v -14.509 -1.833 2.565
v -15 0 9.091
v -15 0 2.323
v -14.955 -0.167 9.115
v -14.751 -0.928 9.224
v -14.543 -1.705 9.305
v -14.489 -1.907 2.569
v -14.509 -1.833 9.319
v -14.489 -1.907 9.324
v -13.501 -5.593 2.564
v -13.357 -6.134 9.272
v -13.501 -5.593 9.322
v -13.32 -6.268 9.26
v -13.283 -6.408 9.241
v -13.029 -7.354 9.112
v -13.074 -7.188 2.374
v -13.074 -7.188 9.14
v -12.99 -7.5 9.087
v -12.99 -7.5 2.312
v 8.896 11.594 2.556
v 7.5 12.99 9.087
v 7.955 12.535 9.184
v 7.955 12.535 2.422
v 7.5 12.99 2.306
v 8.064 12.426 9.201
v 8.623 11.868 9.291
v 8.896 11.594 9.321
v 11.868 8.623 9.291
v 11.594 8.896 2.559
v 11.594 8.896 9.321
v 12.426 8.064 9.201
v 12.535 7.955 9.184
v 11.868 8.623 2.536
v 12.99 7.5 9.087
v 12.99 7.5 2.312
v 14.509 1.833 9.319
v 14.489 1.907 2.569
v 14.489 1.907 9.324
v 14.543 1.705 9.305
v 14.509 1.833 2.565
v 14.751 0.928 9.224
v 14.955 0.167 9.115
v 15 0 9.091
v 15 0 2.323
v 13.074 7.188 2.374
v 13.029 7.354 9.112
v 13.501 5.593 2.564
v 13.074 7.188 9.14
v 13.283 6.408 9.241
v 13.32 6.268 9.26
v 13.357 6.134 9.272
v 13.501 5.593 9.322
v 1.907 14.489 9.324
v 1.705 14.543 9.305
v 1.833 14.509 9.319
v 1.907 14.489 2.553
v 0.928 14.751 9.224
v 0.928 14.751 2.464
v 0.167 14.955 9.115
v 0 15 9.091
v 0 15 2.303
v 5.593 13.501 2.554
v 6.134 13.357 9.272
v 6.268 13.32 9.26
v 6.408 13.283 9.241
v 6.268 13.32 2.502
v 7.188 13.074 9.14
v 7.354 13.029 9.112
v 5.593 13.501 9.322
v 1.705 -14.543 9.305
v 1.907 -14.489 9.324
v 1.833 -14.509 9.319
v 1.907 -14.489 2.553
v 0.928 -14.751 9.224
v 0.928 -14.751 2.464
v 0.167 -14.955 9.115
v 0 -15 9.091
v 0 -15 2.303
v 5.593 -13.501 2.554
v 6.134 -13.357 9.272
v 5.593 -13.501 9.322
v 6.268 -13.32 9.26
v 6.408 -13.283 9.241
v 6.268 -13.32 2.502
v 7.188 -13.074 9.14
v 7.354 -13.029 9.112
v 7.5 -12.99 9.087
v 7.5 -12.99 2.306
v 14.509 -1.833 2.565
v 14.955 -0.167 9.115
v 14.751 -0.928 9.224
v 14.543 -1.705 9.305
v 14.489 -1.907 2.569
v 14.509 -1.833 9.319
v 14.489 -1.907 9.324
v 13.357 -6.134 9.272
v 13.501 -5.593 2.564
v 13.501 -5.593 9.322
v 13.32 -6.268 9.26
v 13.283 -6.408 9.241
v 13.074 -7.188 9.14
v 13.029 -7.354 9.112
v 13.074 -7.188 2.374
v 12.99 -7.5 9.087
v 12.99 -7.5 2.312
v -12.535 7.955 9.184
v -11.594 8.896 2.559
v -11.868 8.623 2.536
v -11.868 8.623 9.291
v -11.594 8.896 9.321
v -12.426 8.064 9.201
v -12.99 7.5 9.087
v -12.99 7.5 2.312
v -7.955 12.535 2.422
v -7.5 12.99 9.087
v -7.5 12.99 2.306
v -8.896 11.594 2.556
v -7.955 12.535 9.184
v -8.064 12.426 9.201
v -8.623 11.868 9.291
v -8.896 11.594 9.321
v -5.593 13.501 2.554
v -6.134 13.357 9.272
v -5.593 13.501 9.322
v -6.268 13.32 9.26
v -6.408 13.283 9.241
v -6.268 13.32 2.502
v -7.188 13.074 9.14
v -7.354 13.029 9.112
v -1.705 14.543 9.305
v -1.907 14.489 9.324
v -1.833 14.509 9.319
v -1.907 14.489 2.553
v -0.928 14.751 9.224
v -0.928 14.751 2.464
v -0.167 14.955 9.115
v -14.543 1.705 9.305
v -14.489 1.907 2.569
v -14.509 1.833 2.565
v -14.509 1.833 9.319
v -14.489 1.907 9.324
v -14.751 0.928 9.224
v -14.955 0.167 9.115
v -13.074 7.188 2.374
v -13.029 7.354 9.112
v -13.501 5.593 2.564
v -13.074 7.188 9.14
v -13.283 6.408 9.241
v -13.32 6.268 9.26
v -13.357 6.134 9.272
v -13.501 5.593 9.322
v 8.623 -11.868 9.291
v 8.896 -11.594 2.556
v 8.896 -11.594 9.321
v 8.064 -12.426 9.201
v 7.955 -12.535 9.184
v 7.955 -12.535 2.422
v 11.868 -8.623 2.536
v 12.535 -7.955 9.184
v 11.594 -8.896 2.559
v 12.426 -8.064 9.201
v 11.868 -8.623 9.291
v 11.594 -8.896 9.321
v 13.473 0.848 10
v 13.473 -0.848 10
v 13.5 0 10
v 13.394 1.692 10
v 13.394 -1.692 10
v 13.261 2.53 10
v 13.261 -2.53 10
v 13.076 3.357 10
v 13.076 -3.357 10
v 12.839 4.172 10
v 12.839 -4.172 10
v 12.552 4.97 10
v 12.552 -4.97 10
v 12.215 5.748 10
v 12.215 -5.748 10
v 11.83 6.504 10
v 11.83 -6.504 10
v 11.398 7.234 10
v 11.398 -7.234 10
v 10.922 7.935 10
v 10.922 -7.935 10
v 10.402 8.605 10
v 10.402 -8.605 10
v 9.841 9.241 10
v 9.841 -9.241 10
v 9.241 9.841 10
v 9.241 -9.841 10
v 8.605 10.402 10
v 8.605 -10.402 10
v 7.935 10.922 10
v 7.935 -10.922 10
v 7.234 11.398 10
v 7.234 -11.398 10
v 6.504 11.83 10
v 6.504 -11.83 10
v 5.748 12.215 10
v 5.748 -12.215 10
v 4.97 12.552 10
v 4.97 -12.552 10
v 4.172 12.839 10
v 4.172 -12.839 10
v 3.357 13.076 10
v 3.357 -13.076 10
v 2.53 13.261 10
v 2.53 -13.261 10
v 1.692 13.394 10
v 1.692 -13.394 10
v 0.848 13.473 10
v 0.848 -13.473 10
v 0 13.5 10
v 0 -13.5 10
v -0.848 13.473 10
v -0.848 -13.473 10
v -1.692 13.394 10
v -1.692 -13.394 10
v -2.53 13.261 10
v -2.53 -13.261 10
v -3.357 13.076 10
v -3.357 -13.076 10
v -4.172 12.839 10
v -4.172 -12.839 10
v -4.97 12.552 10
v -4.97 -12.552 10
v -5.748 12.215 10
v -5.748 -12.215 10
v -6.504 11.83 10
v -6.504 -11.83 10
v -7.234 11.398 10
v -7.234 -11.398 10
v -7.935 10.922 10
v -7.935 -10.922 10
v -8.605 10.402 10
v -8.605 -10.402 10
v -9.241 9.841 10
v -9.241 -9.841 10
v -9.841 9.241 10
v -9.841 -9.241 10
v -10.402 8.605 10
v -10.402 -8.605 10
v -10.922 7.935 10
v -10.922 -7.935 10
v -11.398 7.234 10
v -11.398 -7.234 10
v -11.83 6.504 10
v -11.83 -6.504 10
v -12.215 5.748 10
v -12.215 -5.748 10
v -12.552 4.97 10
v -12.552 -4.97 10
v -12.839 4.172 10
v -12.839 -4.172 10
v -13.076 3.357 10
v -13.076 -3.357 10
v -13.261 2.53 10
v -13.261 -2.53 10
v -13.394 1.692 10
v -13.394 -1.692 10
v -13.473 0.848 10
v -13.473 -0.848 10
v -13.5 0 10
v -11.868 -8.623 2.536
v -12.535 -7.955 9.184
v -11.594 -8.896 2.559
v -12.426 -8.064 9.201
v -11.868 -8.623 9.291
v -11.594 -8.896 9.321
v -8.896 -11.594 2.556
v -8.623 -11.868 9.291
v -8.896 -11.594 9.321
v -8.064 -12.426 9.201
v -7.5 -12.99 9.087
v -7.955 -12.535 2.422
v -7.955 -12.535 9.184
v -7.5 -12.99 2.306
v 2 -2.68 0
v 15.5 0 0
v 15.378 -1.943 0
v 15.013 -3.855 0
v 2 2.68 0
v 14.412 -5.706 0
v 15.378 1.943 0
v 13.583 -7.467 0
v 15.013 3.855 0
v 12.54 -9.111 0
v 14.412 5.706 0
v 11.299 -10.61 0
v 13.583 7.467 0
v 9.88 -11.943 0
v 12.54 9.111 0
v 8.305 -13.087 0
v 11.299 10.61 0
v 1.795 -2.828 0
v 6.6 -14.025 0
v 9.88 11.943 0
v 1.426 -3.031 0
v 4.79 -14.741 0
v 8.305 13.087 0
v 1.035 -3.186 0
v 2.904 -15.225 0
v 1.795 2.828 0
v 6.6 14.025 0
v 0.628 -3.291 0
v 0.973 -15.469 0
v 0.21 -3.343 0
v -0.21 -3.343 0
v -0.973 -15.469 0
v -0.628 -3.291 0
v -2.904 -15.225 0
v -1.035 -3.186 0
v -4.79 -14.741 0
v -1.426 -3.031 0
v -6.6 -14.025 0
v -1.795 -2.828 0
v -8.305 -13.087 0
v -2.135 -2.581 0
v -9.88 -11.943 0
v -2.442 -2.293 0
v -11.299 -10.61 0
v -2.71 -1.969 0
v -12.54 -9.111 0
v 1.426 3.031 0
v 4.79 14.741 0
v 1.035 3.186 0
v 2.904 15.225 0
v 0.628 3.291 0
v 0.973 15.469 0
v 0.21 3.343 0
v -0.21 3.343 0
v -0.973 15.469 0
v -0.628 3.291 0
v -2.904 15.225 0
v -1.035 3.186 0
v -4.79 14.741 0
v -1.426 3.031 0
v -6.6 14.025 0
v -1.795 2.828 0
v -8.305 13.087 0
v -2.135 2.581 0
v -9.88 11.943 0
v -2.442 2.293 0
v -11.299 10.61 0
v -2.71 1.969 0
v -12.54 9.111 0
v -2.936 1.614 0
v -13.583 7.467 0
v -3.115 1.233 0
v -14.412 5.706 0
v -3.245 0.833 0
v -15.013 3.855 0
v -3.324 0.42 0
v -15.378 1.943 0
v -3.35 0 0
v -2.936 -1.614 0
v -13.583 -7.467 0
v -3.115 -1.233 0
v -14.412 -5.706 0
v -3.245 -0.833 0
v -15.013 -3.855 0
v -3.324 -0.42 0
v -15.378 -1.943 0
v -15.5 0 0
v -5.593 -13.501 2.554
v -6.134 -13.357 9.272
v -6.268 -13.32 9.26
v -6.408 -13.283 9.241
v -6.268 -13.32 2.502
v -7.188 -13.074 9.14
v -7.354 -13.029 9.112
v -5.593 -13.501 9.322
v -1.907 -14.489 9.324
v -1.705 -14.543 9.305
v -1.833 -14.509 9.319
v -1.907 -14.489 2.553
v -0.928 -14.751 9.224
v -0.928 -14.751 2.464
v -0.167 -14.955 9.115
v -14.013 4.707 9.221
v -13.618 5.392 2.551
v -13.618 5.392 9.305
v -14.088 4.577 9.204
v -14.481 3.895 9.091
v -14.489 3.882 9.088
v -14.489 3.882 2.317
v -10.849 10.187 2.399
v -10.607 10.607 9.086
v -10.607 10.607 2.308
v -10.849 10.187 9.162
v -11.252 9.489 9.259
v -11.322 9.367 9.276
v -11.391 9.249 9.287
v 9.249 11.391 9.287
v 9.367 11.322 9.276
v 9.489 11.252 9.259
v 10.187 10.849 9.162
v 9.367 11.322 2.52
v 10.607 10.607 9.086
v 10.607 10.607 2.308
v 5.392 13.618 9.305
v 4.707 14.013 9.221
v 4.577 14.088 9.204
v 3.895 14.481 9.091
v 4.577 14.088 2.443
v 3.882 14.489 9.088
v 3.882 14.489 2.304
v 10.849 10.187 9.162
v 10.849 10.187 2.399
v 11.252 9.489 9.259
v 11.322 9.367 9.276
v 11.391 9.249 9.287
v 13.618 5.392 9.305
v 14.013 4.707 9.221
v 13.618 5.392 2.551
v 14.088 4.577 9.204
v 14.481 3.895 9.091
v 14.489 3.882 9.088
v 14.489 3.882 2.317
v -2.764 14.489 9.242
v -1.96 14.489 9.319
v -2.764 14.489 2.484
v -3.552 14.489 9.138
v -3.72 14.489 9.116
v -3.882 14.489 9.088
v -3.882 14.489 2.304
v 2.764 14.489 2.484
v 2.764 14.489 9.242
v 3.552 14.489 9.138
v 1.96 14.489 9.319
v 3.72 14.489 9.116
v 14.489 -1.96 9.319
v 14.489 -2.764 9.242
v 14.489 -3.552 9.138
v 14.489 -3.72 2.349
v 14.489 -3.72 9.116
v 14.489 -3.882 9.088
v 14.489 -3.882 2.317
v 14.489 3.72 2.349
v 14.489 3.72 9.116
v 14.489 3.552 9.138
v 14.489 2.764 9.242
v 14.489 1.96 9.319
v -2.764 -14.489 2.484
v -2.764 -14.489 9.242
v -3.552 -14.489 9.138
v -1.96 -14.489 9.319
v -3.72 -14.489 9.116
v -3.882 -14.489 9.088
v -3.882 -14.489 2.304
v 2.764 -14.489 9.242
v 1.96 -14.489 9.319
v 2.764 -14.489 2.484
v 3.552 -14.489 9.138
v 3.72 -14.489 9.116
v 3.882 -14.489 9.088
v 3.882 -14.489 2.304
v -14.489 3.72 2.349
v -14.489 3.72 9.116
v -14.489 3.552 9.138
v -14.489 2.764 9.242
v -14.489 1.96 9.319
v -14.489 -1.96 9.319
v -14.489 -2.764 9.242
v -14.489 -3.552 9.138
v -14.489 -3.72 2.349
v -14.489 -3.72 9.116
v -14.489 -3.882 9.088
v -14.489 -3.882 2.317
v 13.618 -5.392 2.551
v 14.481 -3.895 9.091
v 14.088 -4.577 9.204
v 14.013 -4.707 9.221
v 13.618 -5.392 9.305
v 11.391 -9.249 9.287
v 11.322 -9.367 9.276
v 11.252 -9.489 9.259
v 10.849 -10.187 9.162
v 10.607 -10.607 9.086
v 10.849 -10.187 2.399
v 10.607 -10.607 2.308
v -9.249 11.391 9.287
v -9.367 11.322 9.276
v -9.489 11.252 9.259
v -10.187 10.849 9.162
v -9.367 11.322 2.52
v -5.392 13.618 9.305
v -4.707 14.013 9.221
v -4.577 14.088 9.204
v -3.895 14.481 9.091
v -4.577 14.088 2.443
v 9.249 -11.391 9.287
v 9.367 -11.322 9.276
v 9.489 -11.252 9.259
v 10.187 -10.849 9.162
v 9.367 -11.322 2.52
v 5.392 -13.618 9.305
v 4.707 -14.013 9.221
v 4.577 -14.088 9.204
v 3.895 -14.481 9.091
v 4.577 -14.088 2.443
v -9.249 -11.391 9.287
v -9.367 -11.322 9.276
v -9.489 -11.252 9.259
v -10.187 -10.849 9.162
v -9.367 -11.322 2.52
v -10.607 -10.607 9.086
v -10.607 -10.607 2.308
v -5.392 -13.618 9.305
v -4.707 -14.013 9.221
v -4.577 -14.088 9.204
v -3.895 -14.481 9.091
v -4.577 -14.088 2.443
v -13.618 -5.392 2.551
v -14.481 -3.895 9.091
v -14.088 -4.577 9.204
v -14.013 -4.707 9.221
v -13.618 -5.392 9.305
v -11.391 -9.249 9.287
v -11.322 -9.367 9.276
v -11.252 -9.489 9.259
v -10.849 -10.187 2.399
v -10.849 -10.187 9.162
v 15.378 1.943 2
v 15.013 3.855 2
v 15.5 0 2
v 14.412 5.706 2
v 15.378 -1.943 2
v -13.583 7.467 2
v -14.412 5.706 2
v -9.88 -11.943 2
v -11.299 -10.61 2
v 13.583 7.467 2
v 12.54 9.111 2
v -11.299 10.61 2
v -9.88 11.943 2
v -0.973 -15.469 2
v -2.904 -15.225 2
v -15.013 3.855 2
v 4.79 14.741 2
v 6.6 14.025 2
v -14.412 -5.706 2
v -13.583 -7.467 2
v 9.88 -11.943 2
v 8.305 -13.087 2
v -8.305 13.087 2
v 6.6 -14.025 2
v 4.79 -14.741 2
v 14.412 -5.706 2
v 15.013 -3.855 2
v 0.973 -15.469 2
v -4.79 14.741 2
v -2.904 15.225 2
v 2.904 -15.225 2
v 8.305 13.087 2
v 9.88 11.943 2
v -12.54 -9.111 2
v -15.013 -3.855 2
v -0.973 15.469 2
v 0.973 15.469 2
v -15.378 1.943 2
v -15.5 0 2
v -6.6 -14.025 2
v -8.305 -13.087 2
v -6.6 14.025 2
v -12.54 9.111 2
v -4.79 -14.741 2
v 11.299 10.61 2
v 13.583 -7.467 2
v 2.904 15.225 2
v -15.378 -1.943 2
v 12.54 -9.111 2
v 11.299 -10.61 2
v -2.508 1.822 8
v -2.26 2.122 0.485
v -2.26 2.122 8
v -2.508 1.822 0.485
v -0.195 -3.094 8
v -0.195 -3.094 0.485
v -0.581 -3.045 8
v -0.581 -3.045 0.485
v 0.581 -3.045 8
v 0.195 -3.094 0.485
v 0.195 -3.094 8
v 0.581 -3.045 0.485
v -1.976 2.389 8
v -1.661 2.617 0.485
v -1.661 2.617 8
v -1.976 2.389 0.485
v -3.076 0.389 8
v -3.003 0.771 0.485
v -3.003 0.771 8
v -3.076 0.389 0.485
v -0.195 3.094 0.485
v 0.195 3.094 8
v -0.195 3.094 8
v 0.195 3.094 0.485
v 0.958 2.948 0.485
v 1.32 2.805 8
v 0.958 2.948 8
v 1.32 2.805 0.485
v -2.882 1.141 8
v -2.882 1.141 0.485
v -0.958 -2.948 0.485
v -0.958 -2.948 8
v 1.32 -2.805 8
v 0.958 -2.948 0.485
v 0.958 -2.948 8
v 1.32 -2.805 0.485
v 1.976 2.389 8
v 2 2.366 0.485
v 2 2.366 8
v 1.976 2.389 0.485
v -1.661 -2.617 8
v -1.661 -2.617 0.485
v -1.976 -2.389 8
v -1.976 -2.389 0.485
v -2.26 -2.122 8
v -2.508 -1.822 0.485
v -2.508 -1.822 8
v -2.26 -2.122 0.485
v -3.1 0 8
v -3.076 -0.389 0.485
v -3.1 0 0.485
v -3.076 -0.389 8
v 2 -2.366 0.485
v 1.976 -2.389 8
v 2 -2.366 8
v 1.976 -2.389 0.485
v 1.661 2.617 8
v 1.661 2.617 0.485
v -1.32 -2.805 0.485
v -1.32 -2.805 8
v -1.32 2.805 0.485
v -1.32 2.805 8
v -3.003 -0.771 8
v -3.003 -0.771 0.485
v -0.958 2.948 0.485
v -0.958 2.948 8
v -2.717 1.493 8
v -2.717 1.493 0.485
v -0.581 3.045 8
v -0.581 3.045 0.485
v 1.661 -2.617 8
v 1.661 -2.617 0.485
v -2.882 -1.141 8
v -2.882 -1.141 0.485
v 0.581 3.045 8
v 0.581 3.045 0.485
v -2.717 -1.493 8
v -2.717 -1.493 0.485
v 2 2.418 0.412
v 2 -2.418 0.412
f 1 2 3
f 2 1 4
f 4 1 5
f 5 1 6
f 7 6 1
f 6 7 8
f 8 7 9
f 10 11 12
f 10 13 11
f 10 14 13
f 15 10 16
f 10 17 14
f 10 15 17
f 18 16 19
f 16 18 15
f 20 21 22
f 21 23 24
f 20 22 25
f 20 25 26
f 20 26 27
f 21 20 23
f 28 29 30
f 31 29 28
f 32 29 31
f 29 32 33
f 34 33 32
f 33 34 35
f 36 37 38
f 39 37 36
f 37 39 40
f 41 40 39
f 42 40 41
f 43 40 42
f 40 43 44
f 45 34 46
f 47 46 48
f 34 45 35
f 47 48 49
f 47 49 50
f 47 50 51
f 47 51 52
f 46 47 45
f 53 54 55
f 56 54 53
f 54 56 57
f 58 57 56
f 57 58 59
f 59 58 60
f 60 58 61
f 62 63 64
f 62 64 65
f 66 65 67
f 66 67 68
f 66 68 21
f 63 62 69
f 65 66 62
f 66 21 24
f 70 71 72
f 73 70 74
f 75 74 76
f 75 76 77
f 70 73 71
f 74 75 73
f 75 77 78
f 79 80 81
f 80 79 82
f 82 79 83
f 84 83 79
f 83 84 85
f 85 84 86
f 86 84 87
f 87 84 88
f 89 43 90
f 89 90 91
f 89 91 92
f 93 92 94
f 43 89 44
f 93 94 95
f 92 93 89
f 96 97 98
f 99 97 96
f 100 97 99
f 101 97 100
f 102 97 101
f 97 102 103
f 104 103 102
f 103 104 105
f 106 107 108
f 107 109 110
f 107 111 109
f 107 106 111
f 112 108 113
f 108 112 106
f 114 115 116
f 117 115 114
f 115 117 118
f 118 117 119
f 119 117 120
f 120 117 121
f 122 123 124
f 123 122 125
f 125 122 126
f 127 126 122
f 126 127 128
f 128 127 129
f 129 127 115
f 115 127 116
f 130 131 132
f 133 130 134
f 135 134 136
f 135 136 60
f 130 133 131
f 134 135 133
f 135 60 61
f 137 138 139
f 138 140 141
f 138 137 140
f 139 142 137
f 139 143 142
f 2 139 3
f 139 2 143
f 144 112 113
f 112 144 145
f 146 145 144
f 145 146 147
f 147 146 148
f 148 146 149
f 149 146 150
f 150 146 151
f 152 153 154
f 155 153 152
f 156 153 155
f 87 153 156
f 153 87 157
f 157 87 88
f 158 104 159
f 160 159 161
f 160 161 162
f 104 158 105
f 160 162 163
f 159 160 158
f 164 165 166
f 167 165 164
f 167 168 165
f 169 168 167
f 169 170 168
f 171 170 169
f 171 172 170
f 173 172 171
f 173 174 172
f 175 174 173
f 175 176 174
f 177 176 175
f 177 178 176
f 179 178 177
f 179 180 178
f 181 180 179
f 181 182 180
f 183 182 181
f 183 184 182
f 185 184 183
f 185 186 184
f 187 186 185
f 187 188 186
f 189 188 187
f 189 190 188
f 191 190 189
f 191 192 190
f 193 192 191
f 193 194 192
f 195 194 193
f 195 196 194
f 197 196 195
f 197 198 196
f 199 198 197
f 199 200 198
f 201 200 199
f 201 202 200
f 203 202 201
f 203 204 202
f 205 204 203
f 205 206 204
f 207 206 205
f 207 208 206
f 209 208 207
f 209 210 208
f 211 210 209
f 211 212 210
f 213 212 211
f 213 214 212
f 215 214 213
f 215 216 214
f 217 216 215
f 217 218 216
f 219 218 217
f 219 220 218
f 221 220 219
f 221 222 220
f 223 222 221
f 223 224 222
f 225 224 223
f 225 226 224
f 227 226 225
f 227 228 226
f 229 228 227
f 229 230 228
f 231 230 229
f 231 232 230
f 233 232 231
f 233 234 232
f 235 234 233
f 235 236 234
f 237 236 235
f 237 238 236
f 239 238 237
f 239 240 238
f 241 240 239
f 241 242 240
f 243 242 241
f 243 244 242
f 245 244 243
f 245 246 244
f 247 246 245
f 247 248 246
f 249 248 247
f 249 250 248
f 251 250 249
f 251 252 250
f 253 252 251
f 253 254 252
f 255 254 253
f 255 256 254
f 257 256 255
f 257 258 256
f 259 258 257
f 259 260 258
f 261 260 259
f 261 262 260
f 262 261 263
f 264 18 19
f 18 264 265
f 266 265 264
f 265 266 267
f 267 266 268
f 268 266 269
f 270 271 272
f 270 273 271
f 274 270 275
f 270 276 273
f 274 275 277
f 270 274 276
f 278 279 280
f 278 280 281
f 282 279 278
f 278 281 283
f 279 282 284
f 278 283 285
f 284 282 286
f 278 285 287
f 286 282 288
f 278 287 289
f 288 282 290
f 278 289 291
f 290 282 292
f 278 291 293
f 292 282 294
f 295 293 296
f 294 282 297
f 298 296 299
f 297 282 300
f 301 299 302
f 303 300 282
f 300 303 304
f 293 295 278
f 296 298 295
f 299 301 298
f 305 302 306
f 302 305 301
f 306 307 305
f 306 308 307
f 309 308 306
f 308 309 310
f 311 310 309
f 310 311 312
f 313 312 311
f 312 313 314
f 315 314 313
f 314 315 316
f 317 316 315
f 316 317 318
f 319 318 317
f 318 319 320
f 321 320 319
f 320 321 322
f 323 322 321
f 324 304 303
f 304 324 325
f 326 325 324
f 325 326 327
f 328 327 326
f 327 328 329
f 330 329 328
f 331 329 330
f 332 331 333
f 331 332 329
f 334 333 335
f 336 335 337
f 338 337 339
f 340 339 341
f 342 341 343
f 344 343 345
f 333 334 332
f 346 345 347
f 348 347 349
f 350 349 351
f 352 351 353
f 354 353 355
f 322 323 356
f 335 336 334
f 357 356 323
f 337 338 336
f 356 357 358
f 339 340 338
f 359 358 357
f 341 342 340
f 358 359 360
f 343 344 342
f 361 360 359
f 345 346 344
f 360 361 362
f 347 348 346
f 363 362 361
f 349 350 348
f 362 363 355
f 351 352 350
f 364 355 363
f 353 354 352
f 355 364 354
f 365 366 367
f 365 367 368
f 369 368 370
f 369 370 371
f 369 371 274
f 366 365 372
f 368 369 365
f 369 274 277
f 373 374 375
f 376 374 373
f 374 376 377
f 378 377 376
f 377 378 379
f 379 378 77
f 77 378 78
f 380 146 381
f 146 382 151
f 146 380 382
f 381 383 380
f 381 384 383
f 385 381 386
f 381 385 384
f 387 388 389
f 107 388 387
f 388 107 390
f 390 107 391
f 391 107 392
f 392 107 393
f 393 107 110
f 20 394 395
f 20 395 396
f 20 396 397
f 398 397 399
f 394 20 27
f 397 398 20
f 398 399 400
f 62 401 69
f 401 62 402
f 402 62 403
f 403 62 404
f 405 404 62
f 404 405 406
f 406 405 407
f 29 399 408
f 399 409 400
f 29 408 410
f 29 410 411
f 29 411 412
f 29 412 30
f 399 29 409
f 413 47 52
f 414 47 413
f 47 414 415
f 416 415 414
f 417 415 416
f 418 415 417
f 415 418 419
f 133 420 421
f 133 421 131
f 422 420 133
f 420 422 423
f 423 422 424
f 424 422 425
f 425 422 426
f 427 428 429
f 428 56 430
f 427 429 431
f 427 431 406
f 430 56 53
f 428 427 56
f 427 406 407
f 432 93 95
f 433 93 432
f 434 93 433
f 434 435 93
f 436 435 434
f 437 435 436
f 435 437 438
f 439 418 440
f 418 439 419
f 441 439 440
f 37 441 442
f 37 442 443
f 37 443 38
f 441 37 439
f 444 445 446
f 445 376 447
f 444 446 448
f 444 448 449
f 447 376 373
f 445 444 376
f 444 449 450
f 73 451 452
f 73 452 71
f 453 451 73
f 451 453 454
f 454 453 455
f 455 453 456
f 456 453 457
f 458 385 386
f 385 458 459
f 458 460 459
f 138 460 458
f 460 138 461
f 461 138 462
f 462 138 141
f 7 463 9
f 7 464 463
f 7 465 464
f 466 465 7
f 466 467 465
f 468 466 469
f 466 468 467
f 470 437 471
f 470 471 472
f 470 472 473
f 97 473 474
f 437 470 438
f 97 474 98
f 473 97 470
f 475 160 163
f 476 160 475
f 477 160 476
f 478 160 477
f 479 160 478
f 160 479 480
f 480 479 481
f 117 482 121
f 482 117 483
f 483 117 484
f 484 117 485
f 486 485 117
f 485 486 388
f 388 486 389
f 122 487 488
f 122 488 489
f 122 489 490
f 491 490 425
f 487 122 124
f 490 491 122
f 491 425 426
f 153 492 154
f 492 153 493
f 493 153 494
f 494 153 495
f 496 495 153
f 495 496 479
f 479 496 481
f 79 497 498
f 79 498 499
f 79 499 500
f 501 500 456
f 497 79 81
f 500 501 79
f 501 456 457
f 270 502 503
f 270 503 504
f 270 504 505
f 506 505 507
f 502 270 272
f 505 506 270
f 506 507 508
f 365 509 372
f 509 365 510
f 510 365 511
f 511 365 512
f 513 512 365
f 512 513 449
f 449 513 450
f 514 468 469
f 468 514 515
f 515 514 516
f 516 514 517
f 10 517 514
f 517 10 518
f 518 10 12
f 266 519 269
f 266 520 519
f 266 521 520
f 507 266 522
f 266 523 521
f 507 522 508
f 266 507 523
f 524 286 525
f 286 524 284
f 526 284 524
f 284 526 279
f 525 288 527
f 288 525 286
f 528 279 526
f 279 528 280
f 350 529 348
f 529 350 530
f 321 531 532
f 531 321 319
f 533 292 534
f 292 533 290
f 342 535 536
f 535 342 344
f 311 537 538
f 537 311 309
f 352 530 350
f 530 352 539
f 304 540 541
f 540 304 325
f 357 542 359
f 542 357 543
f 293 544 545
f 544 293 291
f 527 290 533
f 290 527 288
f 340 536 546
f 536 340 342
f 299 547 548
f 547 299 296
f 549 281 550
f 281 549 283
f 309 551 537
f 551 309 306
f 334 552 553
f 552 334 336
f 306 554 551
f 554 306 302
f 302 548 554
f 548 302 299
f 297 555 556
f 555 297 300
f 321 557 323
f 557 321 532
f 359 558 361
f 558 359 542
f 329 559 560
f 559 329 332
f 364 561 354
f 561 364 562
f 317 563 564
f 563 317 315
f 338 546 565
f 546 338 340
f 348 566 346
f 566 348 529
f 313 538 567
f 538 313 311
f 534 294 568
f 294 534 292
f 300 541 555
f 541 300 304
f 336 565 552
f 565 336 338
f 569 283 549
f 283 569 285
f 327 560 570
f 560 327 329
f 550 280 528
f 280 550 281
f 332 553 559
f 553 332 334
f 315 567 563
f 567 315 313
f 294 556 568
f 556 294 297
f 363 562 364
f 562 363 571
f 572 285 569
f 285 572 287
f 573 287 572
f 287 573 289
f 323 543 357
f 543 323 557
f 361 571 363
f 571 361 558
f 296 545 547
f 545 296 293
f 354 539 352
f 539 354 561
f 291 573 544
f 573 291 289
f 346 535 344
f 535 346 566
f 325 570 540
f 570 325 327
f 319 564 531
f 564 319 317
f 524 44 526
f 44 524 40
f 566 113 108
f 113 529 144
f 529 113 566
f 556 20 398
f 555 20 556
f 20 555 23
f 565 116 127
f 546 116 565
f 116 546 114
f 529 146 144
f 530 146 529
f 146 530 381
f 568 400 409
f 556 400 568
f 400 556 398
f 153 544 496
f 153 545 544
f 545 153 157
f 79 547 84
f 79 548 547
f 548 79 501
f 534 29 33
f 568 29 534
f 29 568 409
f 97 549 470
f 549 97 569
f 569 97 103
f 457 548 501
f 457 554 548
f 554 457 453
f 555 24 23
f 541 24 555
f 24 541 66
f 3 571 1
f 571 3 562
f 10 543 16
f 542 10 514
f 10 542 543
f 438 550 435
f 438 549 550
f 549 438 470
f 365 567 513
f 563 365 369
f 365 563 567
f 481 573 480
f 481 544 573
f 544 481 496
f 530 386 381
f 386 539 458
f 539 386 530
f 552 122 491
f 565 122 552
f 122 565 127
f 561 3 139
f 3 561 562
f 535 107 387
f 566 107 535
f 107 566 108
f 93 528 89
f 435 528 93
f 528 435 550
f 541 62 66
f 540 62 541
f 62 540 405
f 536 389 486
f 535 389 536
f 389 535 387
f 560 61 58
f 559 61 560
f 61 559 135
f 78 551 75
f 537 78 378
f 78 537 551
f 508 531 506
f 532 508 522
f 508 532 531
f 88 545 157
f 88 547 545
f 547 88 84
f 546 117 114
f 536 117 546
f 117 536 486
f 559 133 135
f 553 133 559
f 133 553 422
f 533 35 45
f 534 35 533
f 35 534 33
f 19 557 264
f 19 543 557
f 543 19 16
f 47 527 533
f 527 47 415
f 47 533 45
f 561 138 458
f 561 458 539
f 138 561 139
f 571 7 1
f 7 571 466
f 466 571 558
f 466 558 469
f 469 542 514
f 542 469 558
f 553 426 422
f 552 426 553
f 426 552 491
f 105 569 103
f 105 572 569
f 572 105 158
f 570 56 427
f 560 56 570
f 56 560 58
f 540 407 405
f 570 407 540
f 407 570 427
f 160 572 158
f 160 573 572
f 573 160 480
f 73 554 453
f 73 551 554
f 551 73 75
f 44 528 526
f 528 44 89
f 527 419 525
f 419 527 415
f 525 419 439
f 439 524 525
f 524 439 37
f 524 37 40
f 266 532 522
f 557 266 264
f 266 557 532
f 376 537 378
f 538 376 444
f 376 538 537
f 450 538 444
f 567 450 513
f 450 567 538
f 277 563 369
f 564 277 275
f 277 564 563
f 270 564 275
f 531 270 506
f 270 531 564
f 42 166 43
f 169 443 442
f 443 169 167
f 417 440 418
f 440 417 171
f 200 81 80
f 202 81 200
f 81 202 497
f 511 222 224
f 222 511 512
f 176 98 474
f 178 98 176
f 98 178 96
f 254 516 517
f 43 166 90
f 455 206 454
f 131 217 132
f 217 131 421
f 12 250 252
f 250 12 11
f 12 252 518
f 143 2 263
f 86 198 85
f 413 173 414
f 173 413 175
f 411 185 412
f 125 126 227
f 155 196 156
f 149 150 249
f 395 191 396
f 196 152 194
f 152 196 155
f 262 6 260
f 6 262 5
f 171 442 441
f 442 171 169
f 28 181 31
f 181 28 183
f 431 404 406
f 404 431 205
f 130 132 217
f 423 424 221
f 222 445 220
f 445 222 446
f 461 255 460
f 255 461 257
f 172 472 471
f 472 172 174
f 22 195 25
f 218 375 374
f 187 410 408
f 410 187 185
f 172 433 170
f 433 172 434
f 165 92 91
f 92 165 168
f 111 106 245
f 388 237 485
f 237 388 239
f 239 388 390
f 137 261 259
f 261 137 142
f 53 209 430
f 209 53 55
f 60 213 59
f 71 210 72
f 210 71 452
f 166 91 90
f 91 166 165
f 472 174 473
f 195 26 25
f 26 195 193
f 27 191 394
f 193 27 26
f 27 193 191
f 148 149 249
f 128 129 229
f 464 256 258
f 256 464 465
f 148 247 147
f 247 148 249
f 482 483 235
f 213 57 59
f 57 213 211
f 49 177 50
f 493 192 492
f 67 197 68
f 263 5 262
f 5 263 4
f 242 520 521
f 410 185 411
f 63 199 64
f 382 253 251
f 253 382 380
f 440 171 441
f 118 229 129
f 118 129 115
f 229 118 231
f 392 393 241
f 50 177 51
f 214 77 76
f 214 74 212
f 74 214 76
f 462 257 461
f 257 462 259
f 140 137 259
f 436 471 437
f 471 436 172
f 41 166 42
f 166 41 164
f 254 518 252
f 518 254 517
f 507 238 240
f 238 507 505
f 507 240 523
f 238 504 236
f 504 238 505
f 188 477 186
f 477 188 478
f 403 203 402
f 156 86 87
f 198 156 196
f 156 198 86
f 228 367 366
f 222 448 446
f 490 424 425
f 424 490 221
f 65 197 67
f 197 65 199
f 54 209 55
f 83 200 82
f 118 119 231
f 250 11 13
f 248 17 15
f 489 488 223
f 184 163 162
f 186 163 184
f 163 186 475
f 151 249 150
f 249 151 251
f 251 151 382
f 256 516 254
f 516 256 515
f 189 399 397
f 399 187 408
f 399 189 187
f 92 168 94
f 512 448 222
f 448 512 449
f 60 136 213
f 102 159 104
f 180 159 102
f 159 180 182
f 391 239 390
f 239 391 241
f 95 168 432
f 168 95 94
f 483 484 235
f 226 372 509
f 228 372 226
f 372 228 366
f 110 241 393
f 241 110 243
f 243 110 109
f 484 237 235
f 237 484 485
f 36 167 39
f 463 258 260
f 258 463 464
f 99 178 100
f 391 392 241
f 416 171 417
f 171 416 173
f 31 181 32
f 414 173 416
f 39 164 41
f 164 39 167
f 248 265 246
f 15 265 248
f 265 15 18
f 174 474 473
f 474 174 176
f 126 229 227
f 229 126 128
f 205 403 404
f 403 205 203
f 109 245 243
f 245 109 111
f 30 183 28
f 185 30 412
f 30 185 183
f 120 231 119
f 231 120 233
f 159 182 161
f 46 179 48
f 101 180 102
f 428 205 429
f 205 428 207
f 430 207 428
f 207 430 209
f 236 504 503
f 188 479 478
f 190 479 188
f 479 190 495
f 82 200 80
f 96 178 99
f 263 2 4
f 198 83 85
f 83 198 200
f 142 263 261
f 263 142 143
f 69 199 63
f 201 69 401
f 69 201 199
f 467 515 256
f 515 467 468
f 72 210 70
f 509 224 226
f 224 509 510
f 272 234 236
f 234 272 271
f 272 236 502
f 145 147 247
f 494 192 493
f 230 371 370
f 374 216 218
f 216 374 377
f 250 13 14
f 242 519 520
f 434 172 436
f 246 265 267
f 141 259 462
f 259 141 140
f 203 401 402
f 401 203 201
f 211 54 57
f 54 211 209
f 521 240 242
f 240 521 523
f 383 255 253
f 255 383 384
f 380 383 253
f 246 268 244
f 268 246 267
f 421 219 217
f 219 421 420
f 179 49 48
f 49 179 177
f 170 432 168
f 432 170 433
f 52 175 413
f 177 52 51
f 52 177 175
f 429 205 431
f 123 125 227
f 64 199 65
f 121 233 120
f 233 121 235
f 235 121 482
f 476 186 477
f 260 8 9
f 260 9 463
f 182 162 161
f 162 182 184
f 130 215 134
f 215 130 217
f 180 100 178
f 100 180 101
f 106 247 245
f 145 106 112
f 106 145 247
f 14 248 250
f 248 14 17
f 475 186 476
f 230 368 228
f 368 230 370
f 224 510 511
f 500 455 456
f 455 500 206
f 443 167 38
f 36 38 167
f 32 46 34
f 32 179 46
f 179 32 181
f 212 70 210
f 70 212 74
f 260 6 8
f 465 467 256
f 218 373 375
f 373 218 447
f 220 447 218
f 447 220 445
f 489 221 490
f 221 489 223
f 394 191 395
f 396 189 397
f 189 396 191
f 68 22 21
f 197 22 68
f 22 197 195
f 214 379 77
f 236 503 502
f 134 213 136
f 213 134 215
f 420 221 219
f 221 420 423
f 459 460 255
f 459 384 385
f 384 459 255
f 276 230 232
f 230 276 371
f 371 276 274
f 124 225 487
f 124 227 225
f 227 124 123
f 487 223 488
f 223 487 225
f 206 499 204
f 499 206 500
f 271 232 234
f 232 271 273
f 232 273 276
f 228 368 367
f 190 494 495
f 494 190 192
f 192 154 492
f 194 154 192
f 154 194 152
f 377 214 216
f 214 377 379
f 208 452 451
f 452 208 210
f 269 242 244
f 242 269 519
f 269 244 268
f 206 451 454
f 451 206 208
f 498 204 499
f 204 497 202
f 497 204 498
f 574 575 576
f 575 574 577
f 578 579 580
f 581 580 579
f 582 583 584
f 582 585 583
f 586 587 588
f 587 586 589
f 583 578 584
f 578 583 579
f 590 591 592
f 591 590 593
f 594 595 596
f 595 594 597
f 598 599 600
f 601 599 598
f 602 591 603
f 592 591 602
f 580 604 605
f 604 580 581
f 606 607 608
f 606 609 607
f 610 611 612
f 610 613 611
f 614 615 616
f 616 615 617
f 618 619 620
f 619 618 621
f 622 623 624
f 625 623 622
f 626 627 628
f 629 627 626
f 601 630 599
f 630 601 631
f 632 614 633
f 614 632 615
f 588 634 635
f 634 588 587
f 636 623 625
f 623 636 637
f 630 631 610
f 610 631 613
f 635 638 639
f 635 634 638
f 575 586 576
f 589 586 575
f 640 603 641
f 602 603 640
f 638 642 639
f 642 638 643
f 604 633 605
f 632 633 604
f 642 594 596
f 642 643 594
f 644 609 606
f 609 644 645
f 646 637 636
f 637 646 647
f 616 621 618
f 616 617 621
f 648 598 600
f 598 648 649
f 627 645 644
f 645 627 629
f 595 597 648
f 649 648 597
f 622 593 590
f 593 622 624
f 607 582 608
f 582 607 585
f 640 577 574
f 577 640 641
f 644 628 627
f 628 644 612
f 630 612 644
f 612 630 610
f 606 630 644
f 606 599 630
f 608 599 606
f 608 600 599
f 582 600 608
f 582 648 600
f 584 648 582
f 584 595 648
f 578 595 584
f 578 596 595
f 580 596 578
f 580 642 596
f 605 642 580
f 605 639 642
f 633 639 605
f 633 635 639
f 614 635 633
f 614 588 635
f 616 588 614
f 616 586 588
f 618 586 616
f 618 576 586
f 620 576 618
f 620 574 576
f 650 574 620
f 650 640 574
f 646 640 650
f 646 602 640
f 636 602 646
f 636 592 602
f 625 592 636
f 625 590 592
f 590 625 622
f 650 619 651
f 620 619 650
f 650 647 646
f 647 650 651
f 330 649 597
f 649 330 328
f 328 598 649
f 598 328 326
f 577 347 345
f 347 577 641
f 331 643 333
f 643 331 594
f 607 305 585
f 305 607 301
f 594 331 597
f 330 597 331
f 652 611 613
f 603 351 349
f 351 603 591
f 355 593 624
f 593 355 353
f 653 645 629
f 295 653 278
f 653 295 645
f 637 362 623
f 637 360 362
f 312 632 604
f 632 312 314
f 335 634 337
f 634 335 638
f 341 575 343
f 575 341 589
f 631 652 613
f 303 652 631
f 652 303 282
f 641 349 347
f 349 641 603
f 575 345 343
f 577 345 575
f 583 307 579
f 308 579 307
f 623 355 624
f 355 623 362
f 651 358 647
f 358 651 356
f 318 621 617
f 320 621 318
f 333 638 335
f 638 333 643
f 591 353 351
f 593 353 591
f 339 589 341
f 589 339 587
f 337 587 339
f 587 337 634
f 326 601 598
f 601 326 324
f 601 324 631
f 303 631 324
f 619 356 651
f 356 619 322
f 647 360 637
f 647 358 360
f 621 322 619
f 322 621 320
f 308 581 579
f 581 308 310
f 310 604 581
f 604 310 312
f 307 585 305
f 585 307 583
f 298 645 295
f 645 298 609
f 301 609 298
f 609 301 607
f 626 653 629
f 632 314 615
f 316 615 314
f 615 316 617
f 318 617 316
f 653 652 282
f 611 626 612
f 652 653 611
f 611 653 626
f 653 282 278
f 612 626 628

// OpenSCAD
// copied and adapted from https://www.thingiverse.com/brunobruno

shaft_height = 8;
shaft_depth = 10;

width=30;
diameter_bottom_finish = 1;

extra_height = 0;
toprounding=-3;

shaft_clear = shaft_height-shaft_depth;
n = 12;
min_cap = 2;
height = shaft_height + min_cap + extra_height;
diameterBottom = width + diameter_bottom_finish;

$fn = 100;

difference(){
	intersection(){
		union(){
			cylinder(d=width,h=height,$fn=n);
			rotate(a=360/n/2,v=[0,0,1]) cylinder(d=width,h=height,$fn=n);
			// bottom finish
            cylinder(d=diameterBottom,h=2,$fn=50);
			translate([0,0,2]) cylinder(d1=diameterBottom,d2=0,h=10,$fn=50);
		};
		// top finish
        cylinder(d1=60,d2=width+toprounding,h=height);
	};
    // Shaft
#	difference(){
		union(){
			cylinder(d=6.2,h=shaft_height,$fn=50);
			cylinder(d1=6.7,d2=0,h=6.5,$fn=50);
		}
        translate([0,0, shaft_clear])
		translate([7,0,6]) cube([10,10,shaft_height-shaft_clear],center=true);
	}
}
